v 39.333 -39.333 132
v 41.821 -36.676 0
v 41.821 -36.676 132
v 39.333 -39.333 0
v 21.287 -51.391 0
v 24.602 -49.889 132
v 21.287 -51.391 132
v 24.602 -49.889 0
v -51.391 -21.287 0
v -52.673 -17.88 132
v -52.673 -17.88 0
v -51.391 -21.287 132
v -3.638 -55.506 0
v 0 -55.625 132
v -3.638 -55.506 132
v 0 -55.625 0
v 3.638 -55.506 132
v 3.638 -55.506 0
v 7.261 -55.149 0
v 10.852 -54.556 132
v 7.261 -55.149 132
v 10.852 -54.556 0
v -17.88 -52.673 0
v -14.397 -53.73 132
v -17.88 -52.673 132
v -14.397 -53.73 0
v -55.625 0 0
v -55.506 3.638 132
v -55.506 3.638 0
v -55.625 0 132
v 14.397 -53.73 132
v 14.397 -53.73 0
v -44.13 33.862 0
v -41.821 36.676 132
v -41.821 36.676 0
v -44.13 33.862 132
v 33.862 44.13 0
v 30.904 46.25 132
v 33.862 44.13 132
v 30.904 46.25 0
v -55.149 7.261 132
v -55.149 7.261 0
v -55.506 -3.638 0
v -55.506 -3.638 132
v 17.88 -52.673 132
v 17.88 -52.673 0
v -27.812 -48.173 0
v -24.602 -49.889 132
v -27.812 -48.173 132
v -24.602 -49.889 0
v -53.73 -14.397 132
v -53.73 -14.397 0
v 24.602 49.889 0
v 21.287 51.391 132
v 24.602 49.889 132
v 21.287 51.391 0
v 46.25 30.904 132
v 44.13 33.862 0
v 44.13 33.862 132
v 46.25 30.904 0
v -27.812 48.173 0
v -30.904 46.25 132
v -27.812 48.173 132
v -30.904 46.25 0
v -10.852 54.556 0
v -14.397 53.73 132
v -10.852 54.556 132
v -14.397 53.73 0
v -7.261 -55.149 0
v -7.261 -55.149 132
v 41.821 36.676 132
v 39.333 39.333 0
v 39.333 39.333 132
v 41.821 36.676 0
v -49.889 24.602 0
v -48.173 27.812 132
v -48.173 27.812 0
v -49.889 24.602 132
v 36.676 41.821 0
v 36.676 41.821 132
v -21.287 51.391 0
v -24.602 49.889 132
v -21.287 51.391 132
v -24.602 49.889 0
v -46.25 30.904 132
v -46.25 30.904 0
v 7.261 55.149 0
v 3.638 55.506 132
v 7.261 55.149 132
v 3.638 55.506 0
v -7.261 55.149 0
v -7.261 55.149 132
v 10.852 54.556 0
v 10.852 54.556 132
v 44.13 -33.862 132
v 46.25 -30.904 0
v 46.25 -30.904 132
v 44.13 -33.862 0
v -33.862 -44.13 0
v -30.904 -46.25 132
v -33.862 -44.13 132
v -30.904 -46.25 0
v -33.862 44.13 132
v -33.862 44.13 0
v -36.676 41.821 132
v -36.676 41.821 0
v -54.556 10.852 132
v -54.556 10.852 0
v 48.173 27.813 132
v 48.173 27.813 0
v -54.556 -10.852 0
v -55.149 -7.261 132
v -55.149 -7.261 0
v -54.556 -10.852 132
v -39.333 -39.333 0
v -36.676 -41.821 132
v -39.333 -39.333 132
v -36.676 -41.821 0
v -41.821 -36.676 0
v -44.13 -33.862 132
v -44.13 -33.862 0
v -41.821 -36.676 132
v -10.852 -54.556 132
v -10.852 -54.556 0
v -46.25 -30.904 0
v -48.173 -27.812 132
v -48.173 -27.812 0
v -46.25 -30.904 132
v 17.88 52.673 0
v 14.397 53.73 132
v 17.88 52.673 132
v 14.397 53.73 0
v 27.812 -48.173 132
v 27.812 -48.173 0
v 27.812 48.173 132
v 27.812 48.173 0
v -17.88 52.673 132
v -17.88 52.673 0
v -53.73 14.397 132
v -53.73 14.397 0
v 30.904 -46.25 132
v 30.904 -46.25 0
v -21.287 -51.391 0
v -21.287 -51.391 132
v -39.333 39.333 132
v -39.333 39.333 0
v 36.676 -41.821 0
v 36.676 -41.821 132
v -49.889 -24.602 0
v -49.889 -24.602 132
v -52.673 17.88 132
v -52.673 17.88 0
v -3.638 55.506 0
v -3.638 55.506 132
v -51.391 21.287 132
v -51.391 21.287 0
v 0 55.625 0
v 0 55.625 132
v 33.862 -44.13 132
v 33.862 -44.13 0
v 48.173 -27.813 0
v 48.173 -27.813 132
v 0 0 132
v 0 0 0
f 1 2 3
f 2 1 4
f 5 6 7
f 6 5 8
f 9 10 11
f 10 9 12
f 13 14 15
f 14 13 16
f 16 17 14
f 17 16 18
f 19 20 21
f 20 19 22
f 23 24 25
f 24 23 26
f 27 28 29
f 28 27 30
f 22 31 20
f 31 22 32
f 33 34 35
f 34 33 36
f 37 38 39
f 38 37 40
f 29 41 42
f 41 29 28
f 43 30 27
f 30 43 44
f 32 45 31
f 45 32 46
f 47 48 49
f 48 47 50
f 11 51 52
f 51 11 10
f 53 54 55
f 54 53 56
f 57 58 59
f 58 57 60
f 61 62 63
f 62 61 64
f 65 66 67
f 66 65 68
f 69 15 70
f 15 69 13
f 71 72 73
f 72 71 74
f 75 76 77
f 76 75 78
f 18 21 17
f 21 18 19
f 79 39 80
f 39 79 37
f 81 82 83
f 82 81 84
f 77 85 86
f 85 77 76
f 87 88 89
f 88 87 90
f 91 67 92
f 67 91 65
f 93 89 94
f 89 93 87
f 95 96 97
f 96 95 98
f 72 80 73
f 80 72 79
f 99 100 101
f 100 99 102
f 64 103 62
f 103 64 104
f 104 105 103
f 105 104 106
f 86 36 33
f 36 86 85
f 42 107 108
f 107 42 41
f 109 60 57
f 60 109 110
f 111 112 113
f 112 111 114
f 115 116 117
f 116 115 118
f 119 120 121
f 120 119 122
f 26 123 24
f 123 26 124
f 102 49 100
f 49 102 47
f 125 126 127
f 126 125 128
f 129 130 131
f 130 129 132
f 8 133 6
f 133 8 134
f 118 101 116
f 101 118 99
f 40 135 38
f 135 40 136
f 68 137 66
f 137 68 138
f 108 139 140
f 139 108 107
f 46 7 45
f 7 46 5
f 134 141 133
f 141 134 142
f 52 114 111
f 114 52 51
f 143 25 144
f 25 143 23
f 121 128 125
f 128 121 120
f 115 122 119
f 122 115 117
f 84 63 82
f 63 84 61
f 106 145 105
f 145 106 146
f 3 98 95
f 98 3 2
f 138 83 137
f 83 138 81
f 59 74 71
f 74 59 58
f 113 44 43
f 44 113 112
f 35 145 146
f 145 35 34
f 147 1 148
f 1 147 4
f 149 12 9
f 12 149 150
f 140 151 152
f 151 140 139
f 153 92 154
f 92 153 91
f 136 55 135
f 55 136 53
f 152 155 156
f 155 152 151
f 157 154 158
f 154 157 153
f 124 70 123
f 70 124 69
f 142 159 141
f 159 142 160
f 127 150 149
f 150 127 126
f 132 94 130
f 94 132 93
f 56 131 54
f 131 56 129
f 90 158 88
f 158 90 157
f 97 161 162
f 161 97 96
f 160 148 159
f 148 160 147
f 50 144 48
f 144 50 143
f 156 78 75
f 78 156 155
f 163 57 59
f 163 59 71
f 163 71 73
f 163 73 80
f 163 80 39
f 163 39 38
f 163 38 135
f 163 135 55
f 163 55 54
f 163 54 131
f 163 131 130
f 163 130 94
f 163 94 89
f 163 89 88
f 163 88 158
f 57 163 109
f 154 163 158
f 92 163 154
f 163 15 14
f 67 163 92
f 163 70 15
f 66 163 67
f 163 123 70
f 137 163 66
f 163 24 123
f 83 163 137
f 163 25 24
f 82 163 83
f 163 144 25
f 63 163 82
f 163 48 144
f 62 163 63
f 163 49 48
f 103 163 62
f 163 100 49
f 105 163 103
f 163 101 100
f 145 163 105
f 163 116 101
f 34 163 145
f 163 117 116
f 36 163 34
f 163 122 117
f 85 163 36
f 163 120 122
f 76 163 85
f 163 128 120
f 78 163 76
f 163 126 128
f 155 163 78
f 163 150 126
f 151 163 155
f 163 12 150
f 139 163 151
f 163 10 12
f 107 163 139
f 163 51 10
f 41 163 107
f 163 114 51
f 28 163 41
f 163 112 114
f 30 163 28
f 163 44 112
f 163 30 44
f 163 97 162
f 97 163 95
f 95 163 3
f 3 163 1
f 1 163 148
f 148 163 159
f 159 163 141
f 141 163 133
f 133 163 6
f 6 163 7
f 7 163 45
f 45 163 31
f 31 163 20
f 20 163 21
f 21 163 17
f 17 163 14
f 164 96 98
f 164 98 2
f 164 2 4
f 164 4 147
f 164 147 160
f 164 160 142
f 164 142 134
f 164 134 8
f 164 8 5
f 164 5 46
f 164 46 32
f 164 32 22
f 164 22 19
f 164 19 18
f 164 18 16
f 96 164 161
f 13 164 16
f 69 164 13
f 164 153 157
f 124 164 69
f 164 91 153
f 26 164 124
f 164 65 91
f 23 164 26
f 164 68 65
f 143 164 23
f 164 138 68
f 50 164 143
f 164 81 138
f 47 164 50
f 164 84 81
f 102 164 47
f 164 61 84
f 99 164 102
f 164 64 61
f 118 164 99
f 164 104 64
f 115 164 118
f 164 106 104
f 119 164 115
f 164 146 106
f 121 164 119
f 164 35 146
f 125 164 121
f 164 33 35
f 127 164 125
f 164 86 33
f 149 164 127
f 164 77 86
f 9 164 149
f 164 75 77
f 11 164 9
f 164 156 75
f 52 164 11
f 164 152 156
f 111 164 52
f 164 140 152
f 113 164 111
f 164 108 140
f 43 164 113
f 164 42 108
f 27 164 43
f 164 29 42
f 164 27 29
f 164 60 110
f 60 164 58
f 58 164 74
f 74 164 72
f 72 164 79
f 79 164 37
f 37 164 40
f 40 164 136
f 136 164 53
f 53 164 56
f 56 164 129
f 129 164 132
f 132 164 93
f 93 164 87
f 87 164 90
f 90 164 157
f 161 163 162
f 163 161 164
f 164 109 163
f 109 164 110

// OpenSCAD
// ============================================================
//  MegaPower-class micro-reactor core — parametric CAD model
//  Matches the geometry constants in draw_core_geometry.py so
//  the 3D figure and the CAD part share one source of truth.
//
//  Render with OpenSCAD (free):    openscad core_geometry.scad
//  Export STL :  File → Export → Export as STL
//  Export STEP:  use the "experimental" CGAL-STEP pipeline, or
//                import the STL into FreeCAD and save as STEP.
//
//  All lengths are in cm (same units as the Python script).
// ============================================================

// -----------------------------------------------------------
// Resolution
// -----------------------------------------------------------
$fa = 1;   // min face angle
$fs = 0.6; // min face size (cm)
$fn = 96;  // default circle facets (overridable per-object)

// -----------------------------------------------------------
// Radial geometry (same as Python)
// -----------------------------------------------------------
WALL_1      = 8.84;       // inner hex half-apothem (control-rod channel)
WALL_2      = 29.625;     // outer hex half-apothem (monolith fuel slab)
R_REFL      = 55.625;     // outer reflector radius (vessel radius)
HP_D        = 1.575;      // heat-pipe diameter
FUEL_DO     = 1.425;      // fuel-rod diameter
P_FUEL      = 1.6;        // fuel-rod pitch
P_HP        = 1.6 * sqrt(3);  // heat-pipe pitch

DRUM_CR     = (WALL_2 + R_REFL) / 2;          // drum centre radius
DRUM_R      = (R_REFL - WALL_2) / 2 - 0.4;    // drum radius
DRUM_COUNT  = 6;
B4C_FRAC    = 0.22;                           // absorber arc thickness frac

// -----------------------------------------------------------
// Axial zones (z grows downward in Python; here use +Z up)
// Hence we negate: Z_TOP = 132, Z_BOT = 0.
// -----------------------------------------------------------
H_BASE      = 4.0;    // off-white base band
H_PINK      = 4.0;    // pink band
H_ABS       = 4.0;    // absorber band
H_FUEL      = 116.5;  // salmon fuel slab
H_MONO_CAP  = 3.5;    // gold upper monolith cap
H_TOTAL     = H_BASE + H_PINK + H_ABS + H_FUEL + H_MONO_CAP;   // 132

Z_BASE_BOT  = 0;
Z_PINK_BOT  = Z_BASE_BOT + H_BASE;
Z_ABS_BOT   = Z_PINK_BOT + H_PINK;
Z_FUEL_BOT  = Z_ABS_BOT  + H_ABS;
Z_FUEL_TOP  = Z_FUEL_BOT + H_FUEL;
Z_TOP       = Z_FUEL_TOP + H_MONO_CAP;     // = H_TOTAL

// -----------------------------------------------------------
// Wedge-cut parameters
// -----------------------------------------------------------
CUT_CENTER  = 0;     // wedge centre angle, degrees (0 = +X axis)
CUT_DELTA   = 60;    // wedge included angle, degrees

// -----------------------------------------------------------
// Build switches (tweak here to get different renders)
// -----------------------------------------------------------
BUILD_MAIN_BODY   = true;   // 5/6 cylinder (wedge removed) — "LEFT panel"
BUILD_WEDGE_PIECE = false;  // 60° wedge alone              — "RIGHT panel"
BUILD_DRUMS       = true;   // control drums inside reflector
BUILD_HEATPIPES   = false;  // heat-pipe rods (cosmetic, adds many facets)
BUILD_FUEL_RODS   = false;  // fuel rods (cosmetic)

// -----------------------------------------------------------
// Primitive helpers
// -----------------------------------------------------------

// Regular hex prism with apothem `a` (distance from centre to flat)
// centred at origin, axis = +Z.
module hex_prism(a, h) {
    r = a * 2 / sqrt(3);   // circumradius
    translate([0, 0, 0])
        linear_extrude(height = h)
            polygon([for (k = [0:5])
                      [r * cos(30 + 60*k), r * sin(30 + 60*k)]]);
}

// Wedge subtractor: a pie slice centred at CUT_CENTER, width CUT_DELTA,
// tall enough to slice any axial layer.
module wedge_cut(r_outer, h, z0) {
    pad = 2;
    translate([0, 0, z0 - pad])
        linear_extrude(height = h + 2*pad)
            polygon(concat(
                [[0, 0]],
                [for (k = [0 : 1 : 24])
                   let (t = CUT_CENTER - CUT_DELTA/2
                            + k * CUT_DELTA / 24)
                   [(r_outer + 1) * cos(t), (r_outer + 1) * sin(t)]]
            ));
}

// Annular slab between radii r1 and r2, height h starting at z = z0.
module tube_slab(r1, r2, h, z0) {
    translate([0, 0, z0])
        difference() {
            cylinder(h = h, r = r2);
            translate([0, 0, -0.01]) cylinder(h = h + 0.02, r = r1);
        }
}

// -----------------------------------------------------------
// Core solid: the un-cut reactor, built in axial zones.
// Each zone is tagged with a %color() so STL/STEP exports are
// clean per-zone — paint them in a CAD viewer if desired.
// -----------------------------------------------------------
module core_uncut() {
    // -- Base band (off-white)
    color([248/255, 238/255, 225/255])
        cylinder(h = H_BASE, r = R_REFL);

    // -- Pink band
    color([252/255, 220/255, 220/255])
        translate([0,0,Z_PINK_BOT])
            cylinder(h = H_PINK, r = R_REFL);

    // -- Absorber band (green)
    color([85/255, 200/255, 85/255])
        translate([0,0,Z_ABS_BOT])
            cylinder(h = H_ABS, r = R_REFL);

    // -- Main fuel zone (salmon slab inside monolith hex,
    //    pale-pink channel inside inner hex, gold reflector outside
    //    outer hex — everything between Z_FUEL_BOT and Z_FUEL_TOP).
    translate([0,0,Z_FUEL_BOT]) {
        // Reflector (gold) — annulus between outer hex and vessel wall
        color([218/255, 165/255, 32/255])
            difference() {
                cylinder(h = H_FUEL, r = R_REFL);
                hex_prism(WALL_2, H_FUEL + 0.01);
            }
        // Monolith fuel slab (salmon) — annulus between inner and outer hex
        color([220/255, 130/255, 120/255])
            difference() {
                hex_prism(WALL_2, H_FUEL);
                translate([0,0,-0.005])
                    hex_prism(WALL_1, H_FUEL + 0.01);
            }
        // Control-rod channel (pale pink) — inside inner hex
        color([250/255, 210/255, 210/255])
            hex_prism(WALL_1, H_FUEL);
    }

    // -- Upper monolith cap (gold)
    translate([0,0,Z_FUEL_TOP]) {
        // gold over full reflector + monolith
        color([218/255, 165/255, 32/255])
            difference() {
                cylinder(h = H_MONO_CAP, r = R_REFL);
                translate([0,0,-0.005])
                    hex_prism(WALL_1, H_MONO_CAP + 0.01);
            }
        color([250/255, 210/255, 210/255])
            hex_prism(WALL_1, H_MONO_CAP);
    }
}

// -----------------------------------------------------------
// Control drums — six cylinders embedded in the reflector ring.
// -----------------------------------------------------------
module drums() {
    for (k = [0 : DRUM_COUNT - 1]) {
        ang = 60 * k;
        translate([DRUM_CR * cos(ang), DRUM_CR * sin(ang), Z_FUEL_BOT]) {
            // Drum body (bright gold)
            color([235/255, 190/255, 55/255])
                cylinder(h = H_FUEL, r = DRUM_R);
            // B4C absorber crescent facing inward
            inward = ang + 180;
            rotate([0, 0, inward - 60])
                color([50/255, 205/255, 50/255])
                translate([0, 0, 0])
                    difference() {
                        cylinder(h = H_FUEL + 0.01, r = DRUM_R);
                        translate([0, 0, -0.005])
                            cylinder(h = H_FUEL + 0.02, r = DRUM_R * 0.78);
                        // keep only 120° arc
                        rotate([0, 0, 120])
                            translate([-DRUM_R*2, -DRUM_R*2, -0.01])
                                cube([DRUM_R*4, DRUM_R*4, H_FUEL + 0.03]);
                    }
        }
    }
}

// -----------------------------------------------------------
// Heat-pipe / fuel-rod lattices (optional — expensive).
// Positions are re-computed from the same recurrences used in the
// Python script, replicated 6× around the centre.
// -----------------------------------------------------------
function hp_one_sector() = [
    for (i = [4 : 12])
      for (j = [0 : i - 1])
        let (xs = [for (q = [0 : 40]) WALL_1 + HP_D/2 + q * P_FUEL*1.5],
             ys = [for (q = [0 : 40]) -P_HP*1.5 - q * P_HP/2])
        [ xs[i - 4], ys[i - 4] + j * P_HP ]
];

function fuel_one_sector_a() = [
    for (i = [3 : 10])
      for (j = [0 : i - 1])
        let (xs = [for (q = [0 : 40]) WALL_1 + HP_D/2 + P_FUEL/2
                                      + q * P_FUEL*1.5],
             ys = [for (q = [0 : 40]) -P_HP*1.5 + P_FUEL*sqrt(3)/2
                                      - q * P_FUEL*sqrt(3)/2])
        [ xs[i - 3], ys[i - 3] + j * P_HP ]
];

function fuel_one_sector_b() = [
    for (i = [4 : 11])
      for (j = [0 : i - 1])
        let (xs = [for (q = [0 : 40]) WALL_1 + P_FUEL/2 + HP_D/2
                                      + P_FUEL/2 + q * P_FUEL*1.5],
             ys = [for (q = [0 : 40]) -P_HP*1.5 - q * P_FUEL*sqrt(3)/2])
        [ xs[i - 4], ys[i - 4] + j * P_HP ]
];

module lattice(points, diameter, height, z0, col) {
    for (k = [0 : DRUM_COUNT - 1]) {
        rotate([0, 0, 60 * k])
            for (p = points)
                translate([p[0], p[1], z0])
                    color(col)
                        cylinder(h = height, r = diameter / 2);
    }
}

// -----------------------------------------------------------
// Top-level assembly
// -----------------------------------------------------------
module main_assembly() {
    core_uncut();
    if (BUILD_DRUMS)        drums();
    if (BUILD_HEATPIPES)    lattice(hp_one_sector(), HP_D, H_FUEL,
                                    Z_FUEL_BOT,
                                    [255/255, 215/255, 45/255]);
    if (BUILD_FUEL_RODS) {
        lattice(fuel_one_sector_a(), FUEL_DO, H_FUEL, Z_FUEL_BOT,
                [192/255, 57/255, 43/255]);
        lattice(fuel_one_sector_b(), FUEL_DO, H_FUEL, Z_FUEL_BOT,
                [192/255, 57/255, 43/255]);
    }
}

// -----------------------------------------------------------
// Drive the build
// -----------------------------------------------------------
if (BUILD_MAIN_BODY) {
    difference() {
        main_assembly();
        wedge_cut(R_REFL, H_TOTAL, 0);
    }
}

if (BUILD_WEDGE_PIECE) {
    intersection() {
        main_assembly();
        wedge_cut(R_REFL, H_TOTAL, 0);
    }
}
